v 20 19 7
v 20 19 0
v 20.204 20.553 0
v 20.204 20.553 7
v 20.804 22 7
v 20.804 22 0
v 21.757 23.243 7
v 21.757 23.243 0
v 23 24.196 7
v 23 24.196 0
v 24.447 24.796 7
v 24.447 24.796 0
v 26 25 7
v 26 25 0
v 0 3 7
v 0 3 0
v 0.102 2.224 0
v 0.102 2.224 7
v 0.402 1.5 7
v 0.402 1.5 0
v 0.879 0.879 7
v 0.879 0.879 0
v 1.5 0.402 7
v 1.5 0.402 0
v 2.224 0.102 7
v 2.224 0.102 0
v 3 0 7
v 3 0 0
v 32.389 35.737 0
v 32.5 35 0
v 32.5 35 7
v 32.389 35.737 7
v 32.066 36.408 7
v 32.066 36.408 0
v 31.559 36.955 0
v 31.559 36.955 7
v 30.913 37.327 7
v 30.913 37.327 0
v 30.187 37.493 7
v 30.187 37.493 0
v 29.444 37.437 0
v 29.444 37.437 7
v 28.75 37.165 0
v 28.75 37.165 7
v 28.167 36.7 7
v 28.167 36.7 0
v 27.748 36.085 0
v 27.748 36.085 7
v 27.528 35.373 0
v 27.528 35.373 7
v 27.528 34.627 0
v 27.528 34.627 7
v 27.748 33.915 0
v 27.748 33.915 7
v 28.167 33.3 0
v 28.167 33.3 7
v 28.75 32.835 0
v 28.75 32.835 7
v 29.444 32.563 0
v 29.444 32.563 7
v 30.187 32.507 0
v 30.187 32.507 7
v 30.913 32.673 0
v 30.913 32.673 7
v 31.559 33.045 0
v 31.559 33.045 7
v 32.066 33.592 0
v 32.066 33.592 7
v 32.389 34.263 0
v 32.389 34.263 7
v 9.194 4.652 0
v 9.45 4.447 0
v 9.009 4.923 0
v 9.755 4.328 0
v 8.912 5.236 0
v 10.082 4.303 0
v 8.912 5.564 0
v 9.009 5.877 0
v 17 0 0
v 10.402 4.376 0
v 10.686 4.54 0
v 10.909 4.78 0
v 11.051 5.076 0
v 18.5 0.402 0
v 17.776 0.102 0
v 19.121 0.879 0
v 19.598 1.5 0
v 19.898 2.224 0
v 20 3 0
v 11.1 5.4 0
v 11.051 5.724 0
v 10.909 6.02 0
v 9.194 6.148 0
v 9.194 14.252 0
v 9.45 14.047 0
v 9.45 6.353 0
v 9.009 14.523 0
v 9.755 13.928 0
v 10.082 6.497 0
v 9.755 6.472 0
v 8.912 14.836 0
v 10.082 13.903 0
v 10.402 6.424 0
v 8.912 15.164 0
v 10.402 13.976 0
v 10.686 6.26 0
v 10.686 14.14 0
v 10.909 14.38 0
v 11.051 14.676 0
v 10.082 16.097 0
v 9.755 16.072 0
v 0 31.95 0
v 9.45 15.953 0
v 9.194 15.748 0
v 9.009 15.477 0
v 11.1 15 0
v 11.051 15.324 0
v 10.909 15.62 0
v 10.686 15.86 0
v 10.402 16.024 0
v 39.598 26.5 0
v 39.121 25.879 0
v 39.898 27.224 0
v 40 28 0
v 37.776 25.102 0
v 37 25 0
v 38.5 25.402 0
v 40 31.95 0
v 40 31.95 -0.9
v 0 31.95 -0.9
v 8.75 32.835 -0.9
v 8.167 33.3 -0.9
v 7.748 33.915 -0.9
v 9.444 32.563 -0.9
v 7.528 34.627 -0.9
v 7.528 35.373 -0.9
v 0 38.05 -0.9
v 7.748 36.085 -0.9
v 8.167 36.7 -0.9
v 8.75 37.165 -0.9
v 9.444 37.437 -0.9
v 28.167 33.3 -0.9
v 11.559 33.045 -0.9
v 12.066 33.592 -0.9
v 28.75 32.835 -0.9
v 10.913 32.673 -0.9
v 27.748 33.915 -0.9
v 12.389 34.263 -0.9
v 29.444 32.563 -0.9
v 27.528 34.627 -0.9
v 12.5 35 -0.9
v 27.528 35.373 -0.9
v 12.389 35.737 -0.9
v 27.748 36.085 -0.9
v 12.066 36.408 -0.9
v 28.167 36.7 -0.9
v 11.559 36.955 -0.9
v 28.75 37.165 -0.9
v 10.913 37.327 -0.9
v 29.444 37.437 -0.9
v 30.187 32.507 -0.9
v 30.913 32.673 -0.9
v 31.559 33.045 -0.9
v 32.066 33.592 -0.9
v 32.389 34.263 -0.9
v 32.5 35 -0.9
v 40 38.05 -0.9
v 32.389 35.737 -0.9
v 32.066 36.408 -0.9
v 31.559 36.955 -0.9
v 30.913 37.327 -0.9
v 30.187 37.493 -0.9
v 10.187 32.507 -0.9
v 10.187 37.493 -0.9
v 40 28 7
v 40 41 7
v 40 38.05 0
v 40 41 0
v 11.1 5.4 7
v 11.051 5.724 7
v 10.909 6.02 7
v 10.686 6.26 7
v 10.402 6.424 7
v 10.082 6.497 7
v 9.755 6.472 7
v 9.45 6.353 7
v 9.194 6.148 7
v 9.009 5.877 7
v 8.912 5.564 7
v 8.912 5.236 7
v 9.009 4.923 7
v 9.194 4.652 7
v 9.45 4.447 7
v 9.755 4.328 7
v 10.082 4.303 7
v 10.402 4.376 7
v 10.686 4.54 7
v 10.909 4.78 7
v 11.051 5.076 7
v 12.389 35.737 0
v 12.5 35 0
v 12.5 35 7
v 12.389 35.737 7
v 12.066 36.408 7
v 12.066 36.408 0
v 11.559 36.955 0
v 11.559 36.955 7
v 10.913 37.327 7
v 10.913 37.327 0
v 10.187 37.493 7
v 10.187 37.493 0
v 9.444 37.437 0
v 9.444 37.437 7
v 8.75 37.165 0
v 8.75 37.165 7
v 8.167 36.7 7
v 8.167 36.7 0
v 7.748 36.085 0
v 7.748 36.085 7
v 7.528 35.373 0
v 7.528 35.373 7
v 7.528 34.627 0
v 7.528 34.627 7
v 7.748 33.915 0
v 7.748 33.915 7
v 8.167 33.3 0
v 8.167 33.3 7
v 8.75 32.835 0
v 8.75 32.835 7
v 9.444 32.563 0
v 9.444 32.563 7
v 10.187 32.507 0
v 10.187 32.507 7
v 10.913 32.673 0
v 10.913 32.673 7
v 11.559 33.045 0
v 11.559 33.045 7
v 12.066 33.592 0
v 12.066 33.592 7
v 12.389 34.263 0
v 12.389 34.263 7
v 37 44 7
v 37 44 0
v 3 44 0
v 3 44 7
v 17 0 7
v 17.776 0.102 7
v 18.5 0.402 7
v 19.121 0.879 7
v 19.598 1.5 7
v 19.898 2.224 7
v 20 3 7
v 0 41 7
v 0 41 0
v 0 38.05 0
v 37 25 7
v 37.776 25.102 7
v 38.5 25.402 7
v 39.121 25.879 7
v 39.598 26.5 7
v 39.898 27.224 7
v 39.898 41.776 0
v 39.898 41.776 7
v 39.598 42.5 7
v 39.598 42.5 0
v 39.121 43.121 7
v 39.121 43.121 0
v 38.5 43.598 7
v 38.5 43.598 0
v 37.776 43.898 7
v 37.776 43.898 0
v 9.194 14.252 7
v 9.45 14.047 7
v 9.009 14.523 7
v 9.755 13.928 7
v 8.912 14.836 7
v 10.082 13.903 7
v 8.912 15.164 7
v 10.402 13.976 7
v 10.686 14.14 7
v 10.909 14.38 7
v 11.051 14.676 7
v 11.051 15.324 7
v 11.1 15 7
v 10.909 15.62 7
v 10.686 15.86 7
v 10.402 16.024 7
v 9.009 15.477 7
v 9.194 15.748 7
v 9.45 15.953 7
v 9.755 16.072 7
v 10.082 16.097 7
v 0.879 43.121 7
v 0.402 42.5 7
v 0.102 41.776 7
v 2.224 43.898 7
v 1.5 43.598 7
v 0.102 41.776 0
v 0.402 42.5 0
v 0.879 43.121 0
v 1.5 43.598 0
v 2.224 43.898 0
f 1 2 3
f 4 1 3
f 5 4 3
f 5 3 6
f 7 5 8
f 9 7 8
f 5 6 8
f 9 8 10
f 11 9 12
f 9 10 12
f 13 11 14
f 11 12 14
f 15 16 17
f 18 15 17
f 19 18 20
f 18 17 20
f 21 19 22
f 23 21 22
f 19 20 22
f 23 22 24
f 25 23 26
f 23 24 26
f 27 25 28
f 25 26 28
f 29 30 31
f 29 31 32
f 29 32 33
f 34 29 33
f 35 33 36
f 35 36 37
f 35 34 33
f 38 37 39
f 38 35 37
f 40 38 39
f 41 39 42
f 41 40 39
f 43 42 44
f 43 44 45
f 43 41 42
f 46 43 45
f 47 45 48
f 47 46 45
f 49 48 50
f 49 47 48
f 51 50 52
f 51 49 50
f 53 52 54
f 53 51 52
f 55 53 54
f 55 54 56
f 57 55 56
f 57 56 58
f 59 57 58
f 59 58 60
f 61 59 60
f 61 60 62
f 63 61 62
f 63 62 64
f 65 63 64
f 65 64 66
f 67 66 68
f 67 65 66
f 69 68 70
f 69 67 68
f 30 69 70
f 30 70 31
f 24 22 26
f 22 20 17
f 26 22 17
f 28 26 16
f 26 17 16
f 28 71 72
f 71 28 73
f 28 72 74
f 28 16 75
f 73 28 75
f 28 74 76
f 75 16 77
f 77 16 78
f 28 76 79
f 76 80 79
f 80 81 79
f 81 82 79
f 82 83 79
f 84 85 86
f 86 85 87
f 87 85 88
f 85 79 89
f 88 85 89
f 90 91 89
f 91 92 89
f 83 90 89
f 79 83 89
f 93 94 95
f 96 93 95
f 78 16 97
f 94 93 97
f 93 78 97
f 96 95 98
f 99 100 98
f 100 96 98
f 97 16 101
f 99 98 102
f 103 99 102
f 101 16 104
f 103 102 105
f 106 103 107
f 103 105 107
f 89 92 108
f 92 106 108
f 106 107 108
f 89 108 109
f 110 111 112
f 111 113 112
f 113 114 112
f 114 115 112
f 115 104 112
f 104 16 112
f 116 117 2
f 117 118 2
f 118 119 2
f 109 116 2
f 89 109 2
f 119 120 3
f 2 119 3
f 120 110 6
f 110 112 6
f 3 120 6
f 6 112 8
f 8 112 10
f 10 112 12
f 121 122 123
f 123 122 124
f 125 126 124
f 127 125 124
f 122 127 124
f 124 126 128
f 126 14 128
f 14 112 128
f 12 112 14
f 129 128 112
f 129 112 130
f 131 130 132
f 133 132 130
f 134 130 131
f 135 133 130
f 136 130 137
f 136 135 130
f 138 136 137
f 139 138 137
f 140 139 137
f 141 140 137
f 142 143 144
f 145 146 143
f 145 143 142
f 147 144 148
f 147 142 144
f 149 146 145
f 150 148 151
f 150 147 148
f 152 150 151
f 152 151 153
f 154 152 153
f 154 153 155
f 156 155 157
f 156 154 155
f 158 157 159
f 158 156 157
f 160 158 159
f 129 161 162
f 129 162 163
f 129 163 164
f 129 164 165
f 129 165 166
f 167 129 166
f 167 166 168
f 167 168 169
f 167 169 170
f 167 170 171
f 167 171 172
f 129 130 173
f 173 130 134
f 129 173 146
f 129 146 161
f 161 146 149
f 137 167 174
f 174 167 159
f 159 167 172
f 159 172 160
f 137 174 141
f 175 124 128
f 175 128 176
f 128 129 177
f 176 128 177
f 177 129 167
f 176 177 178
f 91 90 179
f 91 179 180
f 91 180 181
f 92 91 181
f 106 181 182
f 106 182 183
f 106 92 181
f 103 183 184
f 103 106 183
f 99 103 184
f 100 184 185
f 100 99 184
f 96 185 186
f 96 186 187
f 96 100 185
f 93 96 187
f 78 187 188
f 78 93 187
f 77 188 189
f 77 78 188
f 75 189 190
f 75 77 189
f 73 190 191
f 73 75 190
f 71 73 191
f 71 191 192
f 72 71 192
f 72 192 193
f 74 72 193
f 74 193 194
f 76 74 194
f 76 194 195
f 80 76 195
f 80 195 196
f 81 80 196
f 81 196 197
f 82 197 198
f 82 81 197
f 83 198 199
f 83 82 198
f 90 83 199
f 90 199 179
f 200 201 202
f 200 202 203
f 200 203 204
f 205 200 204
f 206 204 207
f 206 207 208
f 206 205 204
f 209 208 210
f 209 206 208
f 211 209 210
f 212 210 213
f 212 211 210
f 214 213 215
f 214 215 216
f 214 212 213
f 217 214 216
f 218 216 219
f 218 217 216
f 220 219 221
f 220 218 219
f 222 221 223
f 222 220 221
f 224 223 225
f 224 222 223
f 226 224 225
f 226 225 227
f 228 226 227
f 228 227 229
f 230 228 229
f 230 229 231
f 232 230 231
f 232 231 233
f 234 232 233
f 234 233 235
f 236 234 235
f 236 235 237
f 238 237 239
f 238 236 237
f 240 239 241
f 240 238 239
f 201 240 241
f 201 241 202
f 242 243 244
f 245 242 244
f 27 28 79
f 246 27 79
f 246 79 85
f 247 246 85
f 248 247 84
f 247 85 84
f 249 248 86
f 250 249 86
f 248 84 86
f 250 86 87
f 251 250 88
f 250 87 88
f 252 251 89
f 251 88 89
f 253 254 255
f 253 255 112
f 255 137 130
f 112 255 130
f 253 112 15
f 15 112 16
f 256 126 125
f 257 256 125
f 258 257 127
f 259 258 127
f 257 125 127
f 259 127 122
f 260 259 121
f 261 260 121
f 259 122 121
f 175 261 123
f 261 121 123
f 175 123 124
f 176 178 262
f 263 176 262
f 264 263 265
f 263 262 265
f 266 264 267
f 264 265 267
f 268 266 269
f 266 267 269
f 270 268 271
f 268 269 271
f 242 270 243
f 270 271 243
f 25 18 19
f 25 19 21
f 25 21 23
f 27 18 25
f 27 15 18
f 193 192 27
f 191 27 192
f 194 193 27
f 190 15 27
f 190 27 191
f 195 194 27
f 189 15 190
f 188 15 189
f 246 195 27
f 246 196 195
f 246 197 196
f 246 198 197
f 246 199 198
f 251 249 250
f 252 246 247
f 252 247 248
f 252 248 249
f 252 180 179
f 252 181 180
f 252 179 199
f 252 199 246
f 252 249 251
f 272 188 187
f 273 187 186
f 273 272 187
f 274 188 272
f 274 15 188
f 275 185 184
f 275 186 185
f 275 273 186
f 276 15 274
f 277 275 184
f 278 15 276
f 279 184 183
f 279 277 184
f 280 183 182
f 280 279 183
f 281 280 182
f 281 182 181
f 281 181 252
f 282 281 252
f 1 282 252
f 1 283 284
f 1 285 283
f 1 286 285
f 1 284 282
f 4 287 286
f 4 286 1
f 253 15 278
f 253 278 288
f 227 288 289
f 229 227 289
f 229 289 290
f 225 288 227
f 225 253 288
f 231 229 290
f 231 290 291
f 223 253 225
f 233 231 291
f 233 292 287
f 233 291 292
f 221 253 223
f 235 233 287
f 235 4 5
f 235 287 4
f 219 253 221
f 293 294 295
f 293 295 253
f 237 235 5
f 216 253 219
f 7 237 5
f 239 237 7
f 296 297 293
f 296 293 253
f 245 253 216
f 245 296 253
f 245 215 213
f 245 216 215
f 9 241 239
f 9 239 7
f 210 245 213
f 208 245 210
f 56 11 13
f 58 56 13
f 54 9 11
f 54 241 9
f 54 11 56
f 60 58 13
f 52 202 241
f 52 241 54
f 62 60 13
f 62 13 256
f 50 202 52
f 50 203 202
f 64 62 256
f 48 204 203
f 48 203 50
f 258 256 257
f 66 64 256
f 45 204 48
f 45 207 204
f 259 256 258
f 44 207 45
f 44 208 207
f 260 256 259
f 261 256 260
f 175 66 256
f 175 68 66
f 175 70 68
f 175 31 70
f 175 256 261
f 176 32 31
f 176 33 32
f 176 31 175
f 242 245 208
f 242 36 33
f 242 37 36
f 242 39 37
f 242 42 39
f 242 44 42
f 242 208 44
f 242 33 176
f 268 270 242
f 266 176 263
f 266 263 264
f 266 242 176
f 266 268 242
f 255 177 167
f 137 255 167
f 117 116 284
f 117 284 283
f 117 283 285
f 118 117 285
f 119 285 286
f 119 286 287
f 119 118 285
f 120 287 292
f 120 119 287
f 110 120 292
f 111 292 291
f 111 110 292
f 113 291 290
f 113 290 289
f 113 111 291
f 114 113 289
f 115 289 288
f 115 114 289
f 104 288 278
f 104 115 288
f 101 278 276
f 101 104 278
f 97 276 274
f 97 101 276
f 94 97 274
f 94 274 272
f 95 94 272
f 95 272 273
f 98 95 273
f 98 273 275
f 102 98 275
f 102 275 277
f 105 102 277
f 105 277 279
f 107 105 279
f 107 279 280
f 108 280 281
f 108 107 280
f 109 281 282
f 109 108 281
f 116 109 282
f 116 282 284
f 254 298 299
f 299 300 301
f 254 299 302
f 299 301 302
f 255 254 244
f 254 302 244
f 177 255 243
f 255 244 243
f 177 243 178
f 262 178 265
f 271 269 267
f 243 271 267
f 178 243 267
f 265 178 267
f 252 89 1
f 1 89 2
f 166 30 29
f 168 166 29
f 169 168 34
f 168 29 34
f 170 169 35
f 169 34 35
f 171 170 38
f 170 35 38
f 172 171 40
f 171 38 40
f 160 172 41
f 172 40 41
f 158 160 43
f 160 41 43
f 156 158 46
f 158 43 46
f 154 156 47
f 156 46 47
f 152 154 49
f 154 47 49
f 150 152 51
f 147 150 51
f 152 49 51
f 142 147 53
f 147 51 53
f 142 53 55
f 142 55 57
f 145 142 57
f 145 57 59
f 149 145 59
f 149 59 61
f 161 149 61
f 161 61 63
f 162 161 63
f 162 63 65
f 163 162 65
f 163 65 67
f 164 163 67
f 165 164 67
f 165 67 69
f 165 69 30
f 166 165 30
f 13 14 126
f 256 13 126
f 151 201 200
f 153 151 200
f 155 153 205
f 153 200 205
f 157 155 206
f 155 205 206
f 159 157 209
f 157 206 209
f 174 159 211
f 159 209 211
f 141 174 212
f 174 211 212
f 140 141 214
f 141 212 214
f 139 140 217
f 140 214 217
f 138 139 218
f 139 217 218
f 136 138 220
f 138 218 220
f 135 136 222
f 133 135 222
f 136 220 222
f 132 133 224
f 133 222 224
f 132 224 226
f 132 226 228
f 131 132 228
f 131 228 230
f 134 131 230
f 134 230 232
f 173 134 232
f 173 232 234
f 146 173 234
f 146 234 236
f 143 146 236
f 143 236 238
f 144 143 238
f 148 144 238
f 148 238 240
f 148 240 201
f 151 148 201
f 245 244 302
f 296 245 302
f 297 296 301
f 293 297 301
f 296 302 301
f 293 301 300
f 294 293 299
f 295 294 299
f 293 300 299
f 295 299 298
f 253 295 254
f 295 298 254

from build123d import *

# Parameters (mm, degrees)
SKETCH1_R           = 2.5
SKETCH1_R_2         = 1.1
BOSS_EXTRUDE1_DEPTH = 7
SKETCH2_W           = 0.9
SKETCH2_H           = 6.1
BOSS_EXTRUDE2_DEPTH = 40
CUT_EXTRUDE1_REACH  = 2.9
SKETCH3_R           = 2.5


with BuildPart() as part:
    # Sketch1 → Boss-Extrude1 (new body)
    with BuildSketch(Plane.XY):
        with BuildLine():
            Line((3, 0), (17, 0))
            ThreePointArc((17, 0), (19.121320344, 0.878679656), (20, 3))
            Line((20, 3), (20, 19))
            ThreePointArc((20, 19), (21.757359313, 23.242640687), (26, 25))
            Line((26, 25), (37, 25))
            ThreePointArc((37, 25), (39.121320344, 25.878679656), (40, 28))
            Line((40, 28), (40, 41))
            ThreePointArc((40, 41), (39.121320344, 43.121320344), (37, 44))
            Line((37, 44), (3, 44))
            ThreePointArc((3, 44), (0.878679656, 43.121320344), (0, 41))
            Line((0, 41), (0, 3))
            ThreePointArc((0, 3), (0.878679656, 0.878679656), (3, 0))
        make_face()
        with Locations((10, 35)):
            Circle(SKETCH1_R, mode=Mode.SUBTRACT)
        with Locations((30, 35)):
            Circle(SKETCH1_R, mode=Mode.SUBTRACT)
        with Locations((10, 5.4)):
            Circle(SKETCH1_R_2, mode=Mode.SUBTRACT)
        with Locations((10, 15)):
            Circle(SKETCH1_R_2, mode=Mode.SUBTRACT)
    extrude(amount=BOSS_EXTRUDE1_DEPTH)

    # Sketch2 → Boss-Extrude2 (add)
    with BuildSketch(Plane(origin=(40, 0, 0), x_dir=(0, 0, -1), z_dir=(1, 0, 0))):
        with Locations((0.45, 35)):
            Rectangle(SKETCH2_W, SKETCH2_H)
    extrude(amount=-BOSS_EXTRUDE2_DEPTH)

    # Sketch3 → Cut-Extrude1 (cut, up to next)
    with BuildSketch(Plane.XY, mode=Mode.PRIVATE) as cut_extrude1_sk1:
        with Locations((10, 35)):
            Circle(SKETCH3_R)
    cut_extrude1_tool1 = extrude(cut_extrude1_sk1.sketch, amount=-CUT_EXTRUDE1_REACH, mode=Mode.PRIVATE) & part.part
    add(cut_extrude1_tool1.solids().sort_by_distance((10, 35, 0))[0], mode=Mode.SUBTRACT)
    # Sketch3 → Cut-Extrude1 (cut, up to next)
    with BuildSketch(Plane.XY, mode=Mode.PRIVATE) as cut_extrude1_sk2:
        with Locations((30, 35)):
            Circle(SKETCH3_R)
    cut_extrude1_tool2 = extrude(cut_extrude1_sk2.sketch, amount=-CUT_EXTRUDE1_REACH, mode=Mode.PRIVATE) & part.part
    add(cut_extrude1_tool2.solids().sort_by_distance((30, 35, 0))[0], mode=Mode.SUBTRACT)


solid = part.part
